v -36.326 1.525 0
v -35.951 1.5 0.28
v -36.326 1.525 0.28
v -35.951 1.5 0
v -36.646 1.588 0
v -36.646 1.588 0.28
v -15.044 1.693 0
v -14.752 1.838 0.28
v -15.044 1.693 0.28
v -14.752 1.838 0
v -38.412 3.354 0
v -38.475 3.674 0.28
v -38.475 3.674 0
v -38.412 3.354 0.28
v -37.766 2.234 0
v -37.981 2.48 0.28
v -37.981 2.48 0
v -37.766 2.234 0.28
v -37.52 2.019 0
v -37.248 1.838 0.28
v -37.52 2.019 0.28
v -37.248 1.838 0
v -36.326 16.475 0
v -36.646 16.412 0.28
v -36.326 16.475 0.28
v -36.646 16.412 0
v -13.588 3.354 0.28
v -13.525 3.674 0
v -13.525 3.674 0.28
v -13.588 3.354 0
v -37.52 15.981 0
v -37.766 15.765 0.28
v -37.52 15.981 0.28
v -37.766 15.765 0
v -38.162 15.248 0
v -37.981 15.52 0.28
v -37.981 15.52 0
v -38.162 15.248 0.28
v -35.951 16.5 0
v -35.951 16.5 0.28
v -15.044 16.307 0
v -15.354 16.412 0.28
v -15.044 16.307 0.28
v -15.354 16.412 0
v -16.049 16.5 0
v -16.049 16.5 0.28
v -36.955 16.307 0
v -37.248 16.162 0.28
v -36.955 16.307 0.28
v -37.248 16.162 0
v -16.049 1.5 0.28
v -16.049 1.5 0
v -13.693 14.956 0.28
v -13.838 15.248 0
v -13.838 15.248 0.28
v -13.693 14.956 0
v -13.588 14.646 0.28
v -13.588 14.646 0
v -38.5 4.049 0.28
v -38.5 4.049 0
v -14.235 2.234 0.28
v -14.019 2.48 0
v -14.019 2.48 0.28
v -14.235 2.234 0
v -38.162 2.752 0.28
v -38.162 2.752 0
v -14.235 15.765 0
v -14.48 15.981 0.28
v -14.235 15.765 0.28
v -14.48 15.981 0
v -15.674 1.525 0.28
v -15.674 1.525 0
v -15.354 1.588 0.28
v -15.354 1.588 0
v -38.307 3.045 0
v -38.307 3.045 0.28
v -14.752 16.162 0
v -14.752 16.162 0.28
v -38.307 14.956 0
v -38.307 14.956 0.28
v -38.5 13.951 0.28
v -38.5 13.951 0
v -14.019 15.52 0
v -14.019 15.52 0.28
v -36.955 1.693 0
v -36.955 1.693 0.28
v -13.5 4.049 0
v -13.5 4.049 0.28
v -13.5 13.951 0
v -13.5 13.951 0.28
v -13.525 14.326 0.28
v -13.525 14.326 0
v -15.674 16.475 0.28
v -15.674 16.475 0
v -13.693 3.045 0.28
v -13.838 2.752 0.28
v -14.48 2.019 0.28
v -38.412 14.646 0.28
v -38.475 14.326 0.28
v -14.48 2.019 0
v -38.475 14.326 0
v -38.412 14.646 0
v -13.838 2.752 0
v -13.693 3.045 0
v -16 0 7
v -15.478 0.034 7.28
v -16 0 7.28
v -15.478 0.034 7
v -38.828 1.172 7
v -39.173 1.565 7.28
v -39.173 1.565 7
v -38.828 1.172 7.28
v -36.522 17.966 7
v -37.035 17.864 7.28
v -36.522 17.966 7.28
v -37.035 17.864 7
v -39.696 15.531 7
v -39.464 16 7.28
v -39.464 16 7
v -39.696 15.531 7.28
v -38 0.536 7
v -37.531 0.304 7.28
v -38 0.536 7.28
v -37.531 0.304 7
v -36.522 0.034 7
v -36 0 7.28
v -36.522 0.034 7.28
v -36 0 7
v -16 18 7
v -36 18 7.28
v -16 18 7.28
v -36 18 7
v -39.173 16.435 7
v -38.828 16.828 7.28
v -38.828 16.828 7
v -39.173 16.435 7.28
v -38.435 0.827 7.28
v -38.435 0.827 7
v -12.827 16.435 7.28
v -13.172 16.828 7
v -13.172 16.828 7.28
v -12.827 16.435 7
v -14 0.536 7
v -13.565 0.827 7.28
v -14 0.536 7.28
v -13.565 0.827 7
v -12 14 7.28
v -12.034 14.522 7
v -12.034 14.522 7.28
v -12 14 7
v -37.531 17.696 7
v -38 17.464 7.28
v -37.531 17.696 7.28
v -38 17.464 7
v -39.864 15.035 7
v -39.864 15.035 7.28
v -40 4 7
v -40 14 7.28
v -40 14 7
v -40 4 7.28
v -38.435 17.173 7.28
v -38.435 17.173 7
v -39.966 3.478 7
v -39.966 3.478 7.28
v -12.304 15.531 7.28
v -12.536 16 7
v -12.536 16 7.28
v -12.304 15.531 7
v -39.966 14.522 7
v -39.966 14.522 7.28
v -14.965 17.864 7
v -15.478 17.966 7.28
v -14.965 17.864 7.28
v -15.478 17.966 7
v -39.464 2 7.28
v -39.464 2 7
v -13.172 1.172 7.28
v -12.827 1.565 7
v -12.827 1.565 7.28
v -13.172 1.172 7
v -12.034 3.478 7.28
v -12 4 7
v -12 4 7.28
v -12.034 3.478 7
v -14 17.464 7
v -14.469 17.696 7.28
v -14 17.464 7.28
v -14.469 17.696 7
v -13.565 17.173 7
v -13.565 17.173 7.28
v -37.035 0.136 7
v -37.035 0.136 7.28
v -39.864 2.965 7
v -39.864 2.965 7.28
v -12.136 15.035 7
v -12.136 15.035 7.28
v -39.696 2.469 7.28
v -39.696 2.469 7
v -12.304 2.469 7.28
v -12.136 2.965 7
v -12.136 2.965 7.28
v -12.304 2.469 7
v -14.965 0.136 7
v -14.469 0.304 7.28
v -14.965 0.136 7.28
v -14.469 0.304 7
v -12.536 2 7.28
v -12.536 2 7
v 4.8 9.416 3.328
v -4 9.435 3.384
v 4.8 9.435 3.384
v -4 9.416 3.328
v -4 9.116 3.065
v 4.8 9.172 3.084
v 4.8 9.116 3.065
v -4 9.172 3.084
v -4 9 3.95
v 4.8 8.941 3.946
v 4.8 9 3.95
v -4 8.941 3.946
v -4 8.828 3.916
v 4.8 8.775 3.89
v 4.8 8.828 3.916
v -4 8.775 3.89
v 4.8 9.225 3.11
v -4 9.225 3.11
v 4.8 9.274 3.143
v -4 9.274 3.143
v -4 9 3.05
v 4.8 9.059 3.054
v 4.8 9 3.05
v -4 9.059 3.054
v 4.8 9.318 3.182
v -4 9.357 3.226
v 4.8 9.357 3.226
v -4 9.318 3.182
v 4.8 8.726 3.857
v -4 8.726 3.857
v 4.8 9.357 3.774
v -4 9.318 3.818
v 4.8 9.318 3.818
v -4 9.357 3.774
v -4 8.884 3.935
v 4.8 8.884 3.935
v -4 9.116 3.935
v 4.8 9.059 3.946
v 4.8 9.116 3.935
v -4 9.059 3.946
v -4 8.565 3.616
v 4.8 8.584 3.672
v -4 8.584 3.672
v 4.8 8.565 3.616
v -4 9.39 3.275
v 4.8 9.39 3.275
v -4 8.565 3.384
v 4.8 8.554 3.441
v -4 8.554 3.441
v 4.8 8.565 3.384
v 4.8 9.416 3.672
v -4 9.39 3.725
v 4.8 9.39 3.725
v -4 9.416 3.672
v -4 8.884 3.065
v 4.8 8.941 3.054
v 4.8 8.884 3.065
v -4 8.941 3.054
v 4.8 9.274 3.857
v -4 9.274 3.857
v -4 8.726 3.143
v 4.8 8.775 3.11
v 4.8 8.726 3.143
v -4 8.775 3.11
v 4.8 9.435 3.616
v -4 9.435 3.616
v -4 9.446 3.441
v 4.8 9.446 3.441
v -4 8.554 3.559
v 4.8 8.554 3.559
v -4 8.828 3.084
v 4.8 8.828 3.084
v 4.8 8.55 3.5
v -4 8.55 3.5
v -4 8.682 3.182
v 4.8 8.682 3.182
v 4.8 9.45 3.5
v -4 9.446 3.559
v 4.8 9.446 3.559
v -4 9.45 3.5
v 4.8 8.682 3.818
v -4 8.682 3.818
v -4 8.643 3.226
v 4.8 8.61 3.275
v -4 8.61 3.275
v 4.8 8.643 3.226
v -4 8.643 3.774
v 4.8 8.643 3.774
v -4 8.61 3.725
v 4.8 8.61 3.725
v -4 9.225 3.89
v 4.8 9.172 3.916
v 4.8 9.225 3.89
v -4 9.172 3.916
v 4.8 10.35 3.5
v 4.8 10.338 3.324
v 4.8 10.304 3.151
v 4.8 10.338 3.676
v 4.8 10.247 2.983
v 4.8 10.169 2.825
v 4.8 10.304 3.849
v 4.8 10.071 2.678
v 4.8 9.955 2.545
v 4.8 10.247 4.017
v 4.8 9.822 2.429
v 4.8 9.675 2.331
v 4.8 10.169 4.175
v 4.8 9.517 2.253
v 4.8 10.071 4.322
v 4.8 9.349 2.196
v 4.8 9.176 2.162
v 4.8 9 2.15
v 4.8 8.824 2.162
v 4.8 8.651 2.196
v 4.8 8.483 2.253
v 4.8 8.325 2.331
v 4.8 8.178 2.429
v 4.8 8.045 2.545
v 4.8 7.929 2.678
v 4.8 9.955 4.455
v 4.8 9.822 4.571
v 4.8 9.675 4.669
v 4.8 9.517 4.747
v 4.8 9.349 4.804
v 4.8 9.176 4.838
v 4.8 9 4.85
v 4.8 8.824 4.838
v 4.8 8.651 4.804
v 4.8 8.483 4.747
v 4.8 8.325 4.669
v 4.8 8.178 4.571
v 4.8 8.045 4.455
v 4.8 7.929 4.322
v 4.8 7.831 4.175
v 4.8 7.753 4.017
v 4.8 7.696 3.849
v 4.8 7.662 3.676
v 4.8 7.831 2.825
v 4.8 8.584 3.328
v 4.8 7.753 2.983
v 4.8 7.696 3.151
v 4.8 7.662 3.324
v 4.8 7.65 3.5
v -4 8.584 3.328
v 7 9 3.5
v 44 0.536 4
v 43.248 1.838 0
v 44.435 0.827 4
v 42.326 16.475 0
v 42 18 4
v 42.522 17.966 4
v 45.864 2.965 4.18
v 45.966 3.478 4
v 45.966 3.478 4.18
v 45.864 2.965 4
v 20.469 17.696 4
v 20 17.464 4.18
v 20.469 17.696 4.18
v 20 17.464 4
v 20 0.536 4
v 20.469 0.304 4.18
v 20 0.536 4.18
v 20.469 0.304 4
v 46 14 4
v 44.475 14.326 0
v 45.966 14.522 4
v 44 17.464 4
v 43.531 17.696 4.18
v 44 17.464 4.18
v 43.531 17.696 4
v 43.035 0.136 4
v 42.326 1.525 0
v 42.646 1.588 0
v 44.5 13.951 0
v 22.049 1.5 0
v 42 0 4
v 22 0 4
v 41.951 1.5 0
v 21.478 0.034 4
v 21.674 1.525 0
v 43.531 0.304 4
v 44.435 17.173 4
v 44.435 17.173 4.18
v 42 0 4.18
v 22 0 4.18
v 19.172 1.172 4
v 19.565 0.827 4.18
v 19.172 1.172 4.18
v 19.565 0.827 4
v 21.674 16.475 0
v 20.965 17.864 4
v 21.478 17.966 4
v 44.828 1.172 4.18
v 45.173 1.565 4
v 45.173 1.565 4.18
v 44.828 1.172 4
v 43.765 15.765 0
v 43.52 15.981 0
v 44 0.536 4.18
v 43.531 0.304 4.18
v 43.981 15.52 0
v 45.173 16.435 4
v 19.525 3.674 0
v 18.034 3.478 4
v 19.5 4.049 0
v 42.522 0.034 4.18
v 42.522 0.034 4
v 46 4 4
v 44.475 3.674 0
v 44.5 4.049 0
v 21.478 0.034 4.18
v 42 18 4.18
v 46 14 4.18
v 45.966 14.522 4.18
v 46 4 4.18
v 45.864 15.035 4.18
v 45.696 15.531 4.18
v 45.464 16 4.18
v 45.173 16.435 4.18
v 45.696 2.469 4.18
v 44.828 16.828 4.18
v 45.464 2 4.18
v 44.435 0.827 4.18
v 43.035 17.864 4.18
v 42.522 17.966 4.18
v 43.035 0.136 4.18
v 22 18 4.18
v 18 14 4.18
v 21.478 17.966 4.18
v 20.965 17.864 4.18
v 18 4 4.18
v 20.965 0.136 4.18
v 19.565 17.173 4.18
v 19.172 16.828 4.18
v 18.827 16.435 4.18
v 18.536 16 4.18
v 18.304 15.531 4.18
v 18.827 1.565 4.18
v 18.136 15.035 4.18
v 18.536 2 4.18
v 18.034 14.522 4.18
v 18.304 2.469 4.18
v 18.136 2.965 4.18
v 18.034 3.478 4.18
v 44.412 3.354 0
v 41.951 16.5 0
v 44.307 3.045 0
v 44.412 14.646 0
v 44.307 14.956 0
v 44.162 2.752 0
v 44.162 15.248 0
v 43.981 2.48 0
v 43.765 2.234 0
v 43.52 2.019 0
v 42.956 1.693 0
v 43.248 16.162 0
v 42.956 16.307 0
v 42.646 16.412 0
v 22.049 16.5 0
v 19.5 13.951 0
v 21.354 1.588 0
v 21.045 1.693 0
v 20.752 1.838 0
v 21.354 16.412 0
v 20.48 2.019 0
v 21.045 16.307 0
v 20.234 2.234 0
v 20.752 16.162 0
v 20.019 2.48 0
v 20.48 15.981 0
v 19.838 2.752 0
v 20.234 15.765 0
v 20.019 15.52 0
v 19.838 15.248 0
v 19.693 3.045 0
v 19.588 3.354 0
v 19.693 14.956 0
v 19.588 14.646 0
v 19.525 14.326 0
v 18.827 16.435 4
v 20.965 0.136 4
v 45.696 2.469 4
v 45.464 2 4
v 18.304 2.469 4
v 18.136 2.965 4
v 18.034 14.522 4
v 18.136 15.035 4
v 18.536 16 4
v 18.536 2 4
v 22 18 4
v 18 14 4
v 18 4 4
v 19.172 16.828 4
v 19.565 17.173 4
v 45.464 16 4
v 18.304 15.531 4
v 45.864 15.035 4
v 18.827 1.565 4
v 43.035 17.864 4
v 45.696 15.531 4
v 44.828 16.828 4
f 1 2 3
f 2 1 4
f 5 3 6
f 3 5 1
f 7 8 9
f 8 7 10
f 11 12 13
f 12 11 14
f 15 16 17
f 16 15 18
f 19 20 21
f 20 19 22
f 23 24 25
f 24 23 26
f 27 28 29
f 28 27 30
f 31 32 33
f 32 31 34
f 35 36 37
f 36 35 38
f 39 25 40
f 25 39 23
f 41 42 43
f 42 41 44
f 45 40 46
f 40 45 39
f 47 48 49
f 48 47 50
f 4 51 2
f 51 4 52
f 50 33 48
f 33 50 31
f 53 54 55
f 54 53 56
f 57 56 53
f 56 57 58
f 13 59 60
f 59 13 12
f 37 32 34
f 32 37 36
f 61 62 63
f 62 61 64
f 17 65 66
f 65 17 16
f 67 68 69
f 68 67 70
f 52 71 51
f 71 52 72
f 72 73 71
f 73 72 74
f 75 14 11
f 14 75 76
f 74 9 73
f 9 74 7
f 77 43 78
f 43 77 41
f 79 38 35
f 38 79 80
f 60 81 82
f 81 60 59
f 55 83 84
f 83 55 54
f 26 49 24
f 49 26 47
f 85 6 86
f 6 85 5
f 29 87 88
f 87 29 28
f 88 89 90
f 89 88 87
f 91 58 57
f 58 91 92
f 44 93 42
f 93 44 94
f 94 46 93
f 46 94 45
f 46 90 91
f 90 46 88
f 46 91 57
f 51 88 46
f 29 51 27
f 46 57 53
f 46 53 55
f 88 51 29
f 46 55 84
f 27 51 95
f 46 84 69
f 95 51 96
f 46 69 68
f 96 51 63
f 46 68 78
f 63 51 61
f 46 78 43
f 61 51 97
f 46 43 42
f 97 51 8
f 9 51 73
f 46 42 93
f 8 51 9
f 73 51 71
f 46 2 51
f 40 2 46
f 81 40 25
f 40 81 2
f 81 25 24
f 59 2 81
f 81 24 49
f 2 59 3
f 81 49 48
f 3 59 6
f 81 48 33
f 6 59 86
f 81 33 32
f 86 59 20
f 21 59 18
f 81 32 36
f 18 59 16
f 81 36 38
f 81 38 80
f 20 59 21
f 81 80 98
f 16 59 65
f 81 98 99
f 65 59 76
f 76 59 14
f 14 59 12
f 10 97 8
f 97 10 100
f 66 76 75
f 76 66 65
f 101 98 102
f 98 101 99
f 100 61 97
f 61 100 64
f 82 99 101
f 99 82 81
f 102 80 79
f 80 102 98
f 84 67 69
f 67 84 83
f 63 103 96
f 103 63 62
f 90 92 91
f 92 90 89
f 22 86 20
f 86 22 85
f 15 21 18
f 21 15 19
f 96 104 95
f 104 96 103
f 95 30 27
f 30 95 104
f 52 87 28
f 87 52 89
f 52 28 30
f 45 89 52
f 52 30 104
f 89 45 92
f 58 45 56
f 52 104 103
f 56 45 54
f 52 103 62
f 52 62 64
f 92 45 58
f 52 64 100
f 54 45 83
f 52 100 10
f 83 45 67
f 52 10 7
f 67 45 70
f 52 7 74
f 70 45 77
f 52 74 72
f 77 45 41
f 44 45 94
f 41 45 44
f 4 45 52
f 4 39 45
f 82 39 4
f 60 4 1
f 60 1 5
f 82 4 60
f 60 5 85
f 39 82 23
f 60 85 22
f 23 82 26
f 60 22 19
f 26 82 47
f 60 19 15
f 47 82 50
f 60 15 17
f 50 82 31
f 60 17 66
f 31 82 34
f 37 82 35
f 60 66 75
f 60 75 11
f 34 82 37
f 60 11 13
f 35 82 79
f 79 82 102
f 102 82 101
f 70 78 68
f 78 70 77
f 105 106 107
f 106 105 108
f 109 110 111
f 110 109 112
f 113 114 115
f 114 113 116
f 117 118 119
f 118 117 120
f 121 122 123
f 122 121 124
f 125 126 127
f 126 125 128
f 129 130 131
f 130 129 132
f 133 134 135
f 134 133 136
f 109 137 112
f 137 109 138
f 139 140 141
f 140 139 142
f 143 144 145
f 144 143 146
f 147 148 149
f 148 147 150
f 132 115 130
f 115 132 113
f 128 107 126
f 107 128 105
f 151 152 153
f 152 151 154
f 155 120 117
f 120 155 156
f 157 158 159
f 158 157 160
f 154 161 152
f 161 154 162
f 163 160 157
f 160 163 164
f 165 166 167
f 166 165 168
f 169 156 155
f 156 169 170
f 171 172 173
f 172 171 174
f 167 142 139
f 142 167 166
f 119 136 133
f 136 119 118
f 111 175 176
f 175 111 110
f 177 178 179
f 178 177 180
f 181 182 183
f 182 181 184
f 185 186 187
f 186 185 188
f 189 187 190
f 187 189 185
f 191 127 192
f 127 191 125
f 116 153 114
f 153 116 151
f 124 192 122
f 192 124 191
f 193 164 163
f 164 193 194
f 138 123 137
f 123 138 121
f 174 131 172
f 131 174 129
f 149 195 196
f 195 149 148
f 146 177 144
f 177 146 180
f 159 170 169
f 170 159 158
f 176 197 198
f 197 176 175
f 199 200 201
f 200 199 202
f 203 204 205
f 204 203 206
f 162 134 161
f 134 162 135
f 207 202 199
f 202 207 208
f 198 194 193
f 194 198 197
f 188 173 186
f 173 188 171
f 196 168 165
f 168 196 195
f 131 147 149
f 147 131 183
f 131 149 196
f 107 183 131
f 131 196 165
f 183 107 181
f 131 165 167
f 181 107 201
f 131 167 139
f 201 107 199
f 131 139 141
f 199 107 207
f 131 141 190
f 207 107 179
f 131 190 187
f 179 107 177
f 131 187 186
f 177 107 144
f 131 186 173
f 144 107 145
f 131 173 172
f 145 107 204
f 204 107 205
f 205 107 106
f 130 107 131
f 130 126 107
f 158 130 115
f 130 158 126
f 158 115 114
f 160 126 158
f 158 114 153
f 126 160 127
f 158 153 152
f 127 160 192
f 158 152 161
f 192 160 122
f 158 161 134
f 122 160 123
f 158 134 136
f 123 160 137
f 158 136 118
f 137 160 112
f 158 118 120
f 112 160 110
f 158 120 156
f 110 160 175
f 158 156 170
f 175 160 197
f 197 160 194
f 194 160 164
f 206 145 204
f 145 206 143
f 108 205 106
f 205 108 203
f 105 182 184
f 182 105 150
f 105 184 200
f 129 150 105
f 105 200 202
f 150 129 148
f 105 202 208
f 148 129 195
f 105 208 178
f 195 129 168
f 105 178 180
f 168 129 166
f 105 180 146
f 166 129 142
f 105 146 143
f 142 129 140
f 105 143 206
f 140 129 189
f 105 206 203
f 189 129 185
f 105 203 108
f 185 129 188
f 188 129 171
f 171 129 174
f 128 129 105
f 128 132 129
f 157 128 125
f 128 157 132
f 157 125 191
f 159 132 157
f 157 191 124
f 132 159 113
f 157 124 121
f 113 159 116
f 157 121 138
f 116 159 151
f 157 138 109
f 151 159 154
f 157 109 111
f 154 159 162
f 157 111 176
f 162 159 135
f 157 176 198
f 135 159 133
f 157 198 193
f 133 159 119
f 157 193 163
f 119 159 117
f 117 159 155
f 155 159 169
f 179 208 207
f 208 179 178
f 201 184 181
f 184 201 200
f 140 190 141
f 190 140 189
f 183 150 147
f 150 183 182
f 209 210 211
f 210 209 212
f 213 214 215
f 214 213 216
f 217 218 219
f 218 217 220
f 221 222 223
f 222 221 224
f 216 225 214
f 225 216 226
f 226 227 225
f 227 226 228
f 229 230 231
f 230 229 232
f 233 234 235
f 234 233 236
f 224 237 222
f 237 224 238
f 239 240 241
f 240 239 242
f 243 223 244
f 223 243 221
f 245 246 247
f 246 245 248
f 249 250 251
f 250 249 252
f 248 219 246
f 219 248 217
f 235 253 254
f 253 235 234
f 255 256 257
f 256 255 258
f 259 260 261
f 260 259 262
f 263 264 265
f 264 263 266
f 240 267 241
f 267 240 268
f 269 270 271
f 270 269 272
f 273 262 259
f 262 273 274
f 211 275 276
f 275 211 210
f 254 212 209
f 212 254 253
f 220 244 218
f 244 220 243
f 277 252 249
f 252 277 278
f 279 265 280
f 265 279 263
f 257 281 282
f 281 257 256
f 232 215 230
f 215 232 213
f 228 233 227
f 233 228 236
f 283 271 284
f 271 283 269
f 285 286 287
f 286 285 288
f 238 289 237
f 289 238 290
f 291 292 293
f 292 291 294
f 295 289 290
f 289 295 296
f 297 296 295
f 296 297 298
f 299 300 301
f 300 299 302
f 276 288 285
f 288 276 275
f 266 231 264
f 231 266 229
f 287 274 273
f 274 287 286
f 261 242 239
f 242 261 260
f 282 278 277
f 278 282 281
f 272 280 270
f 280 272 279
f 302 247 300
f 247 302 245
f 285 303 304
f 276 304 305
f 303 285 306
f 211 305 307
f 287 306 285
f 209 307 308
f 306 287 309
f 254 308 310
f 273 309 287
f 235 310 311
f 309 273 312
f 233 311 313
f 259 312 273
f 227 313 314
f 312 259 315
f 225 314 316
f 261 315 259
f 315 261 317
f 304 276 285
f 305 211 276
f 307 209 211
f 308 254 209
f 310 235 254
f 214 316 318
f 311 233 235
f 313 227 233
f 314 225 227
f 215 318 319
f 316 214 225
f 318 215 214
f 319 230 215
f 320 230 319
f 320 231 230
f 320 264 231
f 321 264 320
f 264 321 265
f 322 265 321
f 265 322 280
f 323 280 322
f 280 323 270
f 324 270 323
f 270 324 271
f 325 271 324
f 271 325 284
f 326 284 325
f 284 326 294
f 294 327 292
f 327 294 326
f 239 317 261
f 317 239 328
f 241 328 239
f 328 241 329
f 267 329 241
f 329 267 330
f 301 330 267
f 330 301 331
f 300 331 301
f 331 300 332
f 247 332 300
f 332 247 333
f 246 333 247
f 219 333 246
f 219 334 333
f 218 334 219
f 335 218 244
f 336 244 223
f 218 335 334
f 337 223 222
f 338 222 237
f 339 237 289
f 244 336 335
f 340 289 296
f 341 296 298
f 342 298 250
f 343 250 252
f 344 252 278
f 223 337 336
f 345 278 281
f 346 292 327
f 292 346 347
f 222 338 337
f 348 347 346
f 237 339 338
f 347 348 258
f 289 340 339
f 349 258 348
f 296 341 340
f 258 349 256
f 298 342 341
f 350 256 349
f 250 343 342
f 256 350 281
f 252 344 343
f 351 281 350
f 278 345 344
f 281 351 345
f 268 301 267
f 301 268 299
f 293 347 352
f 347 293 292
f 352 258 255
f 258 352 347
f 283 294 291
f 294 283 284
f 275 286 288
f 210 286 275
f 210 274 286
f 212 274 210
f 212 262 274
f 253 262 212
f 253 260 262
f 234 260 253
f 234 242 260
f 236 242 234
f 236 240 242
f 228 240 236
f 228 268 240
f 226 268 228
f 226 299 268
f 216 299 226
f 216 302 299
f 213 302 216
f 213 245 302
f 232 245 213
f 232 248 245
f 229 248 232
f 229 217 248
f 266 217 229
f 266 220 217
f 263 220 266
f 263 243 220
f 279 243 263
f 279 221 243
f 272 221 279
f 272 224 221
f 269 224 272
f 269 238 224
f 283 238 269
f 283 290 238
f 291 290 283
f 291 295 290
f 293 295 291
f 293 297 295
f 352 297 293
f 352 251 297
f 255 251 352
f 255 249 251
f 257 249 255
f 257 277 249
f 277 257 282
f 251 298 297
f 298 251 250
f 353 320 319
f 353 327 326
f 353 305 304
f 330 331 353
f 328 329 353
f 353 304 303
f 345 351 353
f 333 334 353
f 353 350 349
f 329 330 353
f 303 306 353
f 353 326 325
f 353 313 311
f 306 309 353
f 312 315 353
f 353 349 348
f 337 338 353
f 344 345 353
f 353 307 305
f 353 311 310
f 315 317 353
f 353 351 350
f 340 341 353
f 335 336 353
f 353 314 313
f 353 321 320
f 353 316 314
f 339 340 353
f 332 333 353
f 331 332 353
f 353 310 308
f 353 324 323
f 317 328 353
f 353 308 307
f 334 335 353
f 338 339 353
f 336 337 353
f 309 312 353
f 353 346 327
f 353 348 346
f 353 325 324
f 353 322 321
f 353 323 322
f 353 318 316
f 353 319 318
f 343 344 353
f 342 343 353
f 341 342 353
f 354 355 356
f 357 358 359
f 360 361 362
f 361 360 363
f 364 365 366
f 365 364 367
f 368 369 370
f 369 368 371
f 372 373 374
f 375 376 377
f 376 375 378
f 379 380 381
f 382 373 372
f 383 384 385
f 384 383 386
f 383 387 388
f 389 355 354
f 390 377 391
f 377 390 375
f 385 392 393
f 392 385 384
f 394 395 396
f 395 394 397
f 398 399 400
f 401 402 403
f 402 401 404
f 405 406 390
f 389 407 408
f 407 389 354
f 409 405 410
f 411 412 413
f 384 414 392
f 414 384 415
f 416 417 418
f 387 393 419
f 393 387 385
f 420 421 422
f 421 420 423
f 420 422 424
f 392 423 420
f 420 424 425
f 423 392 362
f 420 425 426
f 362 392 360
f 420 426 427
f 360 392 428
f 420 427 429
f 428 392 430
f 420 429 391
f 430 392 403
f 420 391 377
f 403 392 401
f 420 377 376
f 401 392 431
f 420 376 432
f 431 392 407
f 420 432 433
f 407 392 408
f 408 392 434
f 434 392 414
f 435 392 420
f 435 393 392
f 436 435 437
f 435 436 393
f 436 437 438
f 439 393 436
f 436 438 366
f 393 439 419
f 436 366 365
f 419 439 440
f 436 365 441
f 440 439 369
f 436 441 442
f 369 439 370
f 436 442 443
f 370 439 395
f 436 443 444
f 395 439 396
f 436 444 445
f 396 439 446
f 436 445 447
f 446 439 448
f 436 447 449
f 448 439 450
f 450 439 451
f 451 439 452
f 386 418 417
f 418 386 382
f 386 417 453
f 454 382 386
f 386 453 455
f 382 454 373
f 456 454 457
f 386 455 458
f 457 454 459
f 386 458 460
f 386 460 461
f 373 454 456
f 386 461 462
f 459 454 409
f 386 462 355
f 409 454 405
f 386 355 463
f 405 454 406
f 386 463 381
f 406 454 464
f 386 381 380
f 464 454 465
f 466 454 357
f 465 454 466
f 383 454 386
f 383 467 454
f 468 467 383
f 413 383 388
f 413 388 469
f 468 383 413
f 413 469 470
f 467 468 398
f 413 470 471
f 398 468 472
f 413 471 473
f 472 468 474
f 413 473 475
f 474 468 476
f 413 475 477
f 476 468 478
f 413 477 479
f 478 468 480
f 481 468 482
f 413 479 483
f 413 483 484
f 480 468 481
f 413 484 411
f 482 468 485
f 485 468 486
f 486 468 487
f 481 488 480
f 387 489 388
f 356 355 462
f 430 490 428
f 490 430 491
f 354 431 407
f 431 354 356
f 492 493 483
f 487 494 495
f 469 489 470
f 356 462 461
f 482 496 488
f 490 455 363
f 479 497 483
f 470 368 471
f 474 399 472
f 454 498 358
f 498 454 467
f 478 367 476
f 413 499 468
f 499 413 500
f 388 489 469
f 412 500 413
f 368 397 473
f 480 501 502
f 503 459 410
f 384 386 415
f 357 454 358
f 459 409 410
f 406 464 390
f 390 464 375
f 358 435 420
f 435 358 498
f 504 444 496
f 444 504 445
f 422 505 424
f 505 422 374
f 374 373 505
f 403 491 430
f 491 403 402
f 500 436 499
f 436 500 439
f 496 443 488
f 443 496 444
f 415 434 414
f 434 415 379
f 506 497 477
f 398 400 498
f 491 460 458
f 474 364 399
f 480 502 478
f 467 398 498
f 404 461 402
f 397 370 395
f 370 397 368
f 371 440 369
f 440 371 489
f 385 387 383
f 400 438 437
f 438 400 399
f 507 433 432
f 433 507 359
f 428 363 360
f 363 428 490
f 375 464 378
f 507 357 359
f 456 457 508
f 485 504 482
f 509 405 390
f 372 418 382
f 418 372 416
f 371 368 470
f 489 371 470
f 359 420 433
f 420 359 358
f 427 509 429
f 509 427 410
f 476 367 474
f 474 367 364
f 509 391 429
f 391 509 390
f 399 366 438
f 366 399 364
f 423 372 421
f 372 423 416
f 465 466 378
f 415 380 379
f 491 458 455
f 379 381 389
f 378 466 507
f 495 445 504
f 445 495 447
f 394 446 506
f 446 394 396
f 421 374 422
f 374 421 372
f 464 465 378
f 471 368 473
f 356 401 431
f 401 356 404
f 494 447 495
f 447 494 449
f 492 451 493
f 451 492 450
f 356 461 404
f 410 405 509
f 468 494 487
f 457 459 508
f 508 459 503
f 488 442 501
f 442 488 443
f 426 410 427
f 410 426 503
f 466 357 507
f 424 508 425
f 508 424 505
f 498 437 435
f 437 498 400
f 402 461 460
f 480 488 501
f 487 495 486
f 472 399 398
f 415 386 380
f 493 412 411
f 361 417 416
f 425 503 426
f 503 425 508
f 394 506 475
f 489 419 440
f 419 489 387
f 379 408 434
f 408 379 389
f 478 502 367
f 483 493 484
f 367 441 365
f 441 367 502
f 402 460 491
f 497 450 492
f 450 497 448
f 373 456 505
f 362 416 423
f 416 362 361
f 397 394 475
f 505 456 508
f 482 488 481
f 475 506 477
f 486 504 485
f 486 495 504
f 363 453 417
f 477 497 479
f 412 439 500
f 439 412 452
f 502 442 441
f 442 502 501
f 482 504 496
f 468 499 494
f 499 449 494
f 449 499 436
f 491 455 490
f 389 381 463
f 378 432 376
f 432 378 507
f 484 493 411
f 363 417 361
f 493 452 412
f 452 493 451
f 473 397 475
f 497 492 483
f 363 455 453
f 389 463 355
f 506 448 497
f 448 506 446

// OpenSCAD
// OpenSCAD design concepts — visual examples.
//
// Each illustration is deliberately simple. Whenever possible it shows
// INPUT on the left and RESULT on the right so the operation can be read
// from the picture before reading the text.

$fn = 48;

concept_step = "01_keep"; // [01_keep,02_cut,03_clip,04_hull_keep,05_hull_cut,06_convexity,07_decompose]

module rounded_box_2d(w=28, d=18, r=4) {
    hull()
        for (x=[r, w-r], y=[r, d-r])
            translate([x,y]) circle(r);
}

module thin_profile(z, scale_delta=0, h=0.18) {
    translate([0,0,z])
        linear_extrude(h)
            offset(delta=scale_delta)
                rounded_box_2d();
}

module chamfer_body() {
    hull() {
        thin_profile(0, -1.5);
        thin_profile(4, 0);
    }
}

module arrow_x(length=11) {
    color([0.25,0.25,0.25]) {
        rotate([0,90,0])
            cylinder(h=length-2.2, r=0.45);
        translate([length-2.2,0,0])
            rotate([0,90,0])
                cylinder(h=2.2, r1=1.35, r2=0);
    }
}

module concept_keep() {
    // LEFT: the two profiles we start from, pulled apart so both are obvious.
    translate([-40,0,0]) {
        color([0.95,0.55,0.18])
            thin_profile(0, -1.5, 0.28);
        color([0.20,0.55,0.90])
            thin_profile(7, 0, 0.28);
    }

    translate([-4,9,3.5])
        arrow_x(11);

    // RIGHT: the material produced by joining the profiles is kept.
    translate([18,0,0])
        color([0.25,0.70,0.40])
            chamfer_body();
}

module concept_cut() {
    // LEFT: body plus red volume that describes what must disappear.
    translate([-42,0,0]) {
        color([0.65,0.70,0.76])
            cube([30,22,10]);
        color([0.90,0.25,0.20])
            translate([15,11,-1])
                cylinder(h=12, r=4.5);
    }

    translate([-5,11,5])
        arrow_x(11);

    // RIGHT: difference() result.
    translate([20,0,0])
        color([0.25,0.70,0.40])
            difference() {
                cube([30,22,10]);
                translate([15,11,-1])
                    cylinder(h=12, r=4.5);
            }
}

module concept_clip() {
    // LEFT: orange part is too long.
    translate([-44,0,0]) {
        color([0.95,0.55,0.18])
            translate([-6,0,0])
                cube([42,16,8]);

        // Blue plate floats above it and shows the allowed X/Y footprint.
        // Keeping it separate avoids hiding the orange overhang.
        color([0.20,0.55,0.90])
            translate([0,0,11])
                cube([30,16,0.8]);
    }

    translate([-3,8,4])
        arrow_x(11);

    // RIGHT: only the part inside that footprint remains.
    translate([20,0,0])
        color([0.25,0.70,0.40])
            intersection() {
                translate([-6,0,0]) cube([42,16,8]);
                cube([30,16,10]);
            }
}

module concept_hull_keep() {
    // LEFT: the hull inputs.
    translate([-40,0,0]) {
        color([0.95,0.55,0.18])
            thin_profile(0, -1.5, 0.28);
        color([0.20,0.55,0.90])
            thin_profile(7, 0, 0.28);
    }

    translate([-4,9,3.5])
        arrow_x(11);

    // RIGHT: the hull itself is the wanted body.
    translate([18,0,0])
        color([0.25,0.70,0.40])
            chamfer_body();
}

module inner_profile_2d(w=20,d=12,r=3) {
    translate([4,3])
        hull()
            for (x=[r,w-r], y=[r,d-r])
                translate([x,y]) circle(r);
}

module inner_layer(z, expansion=0, h=0.18) {
    translate([0,0,z])
        linear_extrude(h)
            offset(delta=expansion)
                inner_profile_2d();
}

module chamfer_cutter() {
    hull() {
        inner_layer(0, 1.5);
        inner_layer(4, 0);
    }
}

module hollow_body_with_chamfer() {
    difference() {
        cube([30,20,8]);

        // Normal opening continues through the whole body.
        translate([0,0,-1])
            linear_extrude(10)
                inner_profile_2d();

        // The tapered cutter enlarges the opening only near the end face.
        chamfer_cutter();
    }
}

module concept_hull_cut() {
    // LEFT: two opening profiles.
    translate([-55,0,0]) {
        color([0.95,0.55,0.18])
            inner_layer(0, 1.5, 0.28);
        color([0.20,0.55,0.90])
            inner_layer(7, 0, 0.28);
    }

    translate([-27,9,3.5])
        arrow_x(9);

    // MIDDLE: hull turns them into a solid cutter.
    translate([-12,0,0])
        color([0.90,0.25,0.20])
            chamfer_cutter();

    translate([18,9,3.5])
        arrow_x(9);

    // RIGHT: subtract the normal opening and the cutter from the body.
    translate([34,0,0])
        color([0.25,0.70,0.40])
            hollow_body_with_chamfer();
}

module l_2d(size=24, wall=7) {
    union() {
        square([size,wall]);
        square([wall,size]);
    }
}

module concept_convexity() {
    // LEFT: a convex rounded rectangle. Its convex hull changes nothing.
    translate([-34,0,0]) {
        color([0.25,0.70,0.40])
            linear_extrude(0.8)
                hull()
                    rounded_box_2d(26,18,4);
    }

    // RIGHT: grey is the intended L. Red underneath is hull(L).
    // The red triangle visible in the missing corner is the unwanted bridge.
    translate([20,0,0]) {
        color([0.90,0.25,0.20])
            linear_extrude(0.6)
                hull()
                    l_2d();

        color([0.65,0.70,0.76])
            translate([0,0,0.8])
                linear_extrude(0.6)
                    l_2d();
    }
}

module base_with_main_void(length=26) {
    difference() {
        cube([length,16,8]);
        translate([6,4,-1])
            cube([12,8,10]);
    }
}

module base_with_local_cut(length=26) {
    difference() {
        base_with_main_void(length);
        translate([length-2,8,6])
            rotate([0,45,0])
                cube([8,5,5], center=true);
    }
}

module concept_decompose() {
    // 1: start with an easy outside body.
    translate([-63,0,0])
        color([0.25,0.70,0.40])
            cube([26,16,8]);

    translate([-33,8,4])
        arrow_x(7);

    // 2: subtract the main void.
    translate([-21,0,0])
        color([0.25,0.70,0.40])
            base_with_main_void();

    translate([9,8,4])
        arrow_x(7);

    // 3: subtract a small local detail.
    translate([21,0,0])
        color([0.25,0.70,0.40])
            base_with_local_cut();

    translate([51,8,4])
        arrow_x(7);

    // 4: trim the overlong end to the final length.
    translate([63,0,0])
        color([0.25,0.70,0.40])
            intersection() {
                base_with_local_cut();
                cube([22,16,10]);
            }
}

if (concept_step == "01_keep")
    concept_keep();
else if (concept_step == "02_cut")
    concept_cut();
else if (concept_step == "03_clip")
    concept_clip();
else if (concept_step == "04_hull_keep")
    concept_hull_keep();
else if (concept_step == "05_hull_cut")
    concept_hull_cut();
else if (concept_step == "06_convexity")
    concept_convexity();
else
    concept_decompose();
